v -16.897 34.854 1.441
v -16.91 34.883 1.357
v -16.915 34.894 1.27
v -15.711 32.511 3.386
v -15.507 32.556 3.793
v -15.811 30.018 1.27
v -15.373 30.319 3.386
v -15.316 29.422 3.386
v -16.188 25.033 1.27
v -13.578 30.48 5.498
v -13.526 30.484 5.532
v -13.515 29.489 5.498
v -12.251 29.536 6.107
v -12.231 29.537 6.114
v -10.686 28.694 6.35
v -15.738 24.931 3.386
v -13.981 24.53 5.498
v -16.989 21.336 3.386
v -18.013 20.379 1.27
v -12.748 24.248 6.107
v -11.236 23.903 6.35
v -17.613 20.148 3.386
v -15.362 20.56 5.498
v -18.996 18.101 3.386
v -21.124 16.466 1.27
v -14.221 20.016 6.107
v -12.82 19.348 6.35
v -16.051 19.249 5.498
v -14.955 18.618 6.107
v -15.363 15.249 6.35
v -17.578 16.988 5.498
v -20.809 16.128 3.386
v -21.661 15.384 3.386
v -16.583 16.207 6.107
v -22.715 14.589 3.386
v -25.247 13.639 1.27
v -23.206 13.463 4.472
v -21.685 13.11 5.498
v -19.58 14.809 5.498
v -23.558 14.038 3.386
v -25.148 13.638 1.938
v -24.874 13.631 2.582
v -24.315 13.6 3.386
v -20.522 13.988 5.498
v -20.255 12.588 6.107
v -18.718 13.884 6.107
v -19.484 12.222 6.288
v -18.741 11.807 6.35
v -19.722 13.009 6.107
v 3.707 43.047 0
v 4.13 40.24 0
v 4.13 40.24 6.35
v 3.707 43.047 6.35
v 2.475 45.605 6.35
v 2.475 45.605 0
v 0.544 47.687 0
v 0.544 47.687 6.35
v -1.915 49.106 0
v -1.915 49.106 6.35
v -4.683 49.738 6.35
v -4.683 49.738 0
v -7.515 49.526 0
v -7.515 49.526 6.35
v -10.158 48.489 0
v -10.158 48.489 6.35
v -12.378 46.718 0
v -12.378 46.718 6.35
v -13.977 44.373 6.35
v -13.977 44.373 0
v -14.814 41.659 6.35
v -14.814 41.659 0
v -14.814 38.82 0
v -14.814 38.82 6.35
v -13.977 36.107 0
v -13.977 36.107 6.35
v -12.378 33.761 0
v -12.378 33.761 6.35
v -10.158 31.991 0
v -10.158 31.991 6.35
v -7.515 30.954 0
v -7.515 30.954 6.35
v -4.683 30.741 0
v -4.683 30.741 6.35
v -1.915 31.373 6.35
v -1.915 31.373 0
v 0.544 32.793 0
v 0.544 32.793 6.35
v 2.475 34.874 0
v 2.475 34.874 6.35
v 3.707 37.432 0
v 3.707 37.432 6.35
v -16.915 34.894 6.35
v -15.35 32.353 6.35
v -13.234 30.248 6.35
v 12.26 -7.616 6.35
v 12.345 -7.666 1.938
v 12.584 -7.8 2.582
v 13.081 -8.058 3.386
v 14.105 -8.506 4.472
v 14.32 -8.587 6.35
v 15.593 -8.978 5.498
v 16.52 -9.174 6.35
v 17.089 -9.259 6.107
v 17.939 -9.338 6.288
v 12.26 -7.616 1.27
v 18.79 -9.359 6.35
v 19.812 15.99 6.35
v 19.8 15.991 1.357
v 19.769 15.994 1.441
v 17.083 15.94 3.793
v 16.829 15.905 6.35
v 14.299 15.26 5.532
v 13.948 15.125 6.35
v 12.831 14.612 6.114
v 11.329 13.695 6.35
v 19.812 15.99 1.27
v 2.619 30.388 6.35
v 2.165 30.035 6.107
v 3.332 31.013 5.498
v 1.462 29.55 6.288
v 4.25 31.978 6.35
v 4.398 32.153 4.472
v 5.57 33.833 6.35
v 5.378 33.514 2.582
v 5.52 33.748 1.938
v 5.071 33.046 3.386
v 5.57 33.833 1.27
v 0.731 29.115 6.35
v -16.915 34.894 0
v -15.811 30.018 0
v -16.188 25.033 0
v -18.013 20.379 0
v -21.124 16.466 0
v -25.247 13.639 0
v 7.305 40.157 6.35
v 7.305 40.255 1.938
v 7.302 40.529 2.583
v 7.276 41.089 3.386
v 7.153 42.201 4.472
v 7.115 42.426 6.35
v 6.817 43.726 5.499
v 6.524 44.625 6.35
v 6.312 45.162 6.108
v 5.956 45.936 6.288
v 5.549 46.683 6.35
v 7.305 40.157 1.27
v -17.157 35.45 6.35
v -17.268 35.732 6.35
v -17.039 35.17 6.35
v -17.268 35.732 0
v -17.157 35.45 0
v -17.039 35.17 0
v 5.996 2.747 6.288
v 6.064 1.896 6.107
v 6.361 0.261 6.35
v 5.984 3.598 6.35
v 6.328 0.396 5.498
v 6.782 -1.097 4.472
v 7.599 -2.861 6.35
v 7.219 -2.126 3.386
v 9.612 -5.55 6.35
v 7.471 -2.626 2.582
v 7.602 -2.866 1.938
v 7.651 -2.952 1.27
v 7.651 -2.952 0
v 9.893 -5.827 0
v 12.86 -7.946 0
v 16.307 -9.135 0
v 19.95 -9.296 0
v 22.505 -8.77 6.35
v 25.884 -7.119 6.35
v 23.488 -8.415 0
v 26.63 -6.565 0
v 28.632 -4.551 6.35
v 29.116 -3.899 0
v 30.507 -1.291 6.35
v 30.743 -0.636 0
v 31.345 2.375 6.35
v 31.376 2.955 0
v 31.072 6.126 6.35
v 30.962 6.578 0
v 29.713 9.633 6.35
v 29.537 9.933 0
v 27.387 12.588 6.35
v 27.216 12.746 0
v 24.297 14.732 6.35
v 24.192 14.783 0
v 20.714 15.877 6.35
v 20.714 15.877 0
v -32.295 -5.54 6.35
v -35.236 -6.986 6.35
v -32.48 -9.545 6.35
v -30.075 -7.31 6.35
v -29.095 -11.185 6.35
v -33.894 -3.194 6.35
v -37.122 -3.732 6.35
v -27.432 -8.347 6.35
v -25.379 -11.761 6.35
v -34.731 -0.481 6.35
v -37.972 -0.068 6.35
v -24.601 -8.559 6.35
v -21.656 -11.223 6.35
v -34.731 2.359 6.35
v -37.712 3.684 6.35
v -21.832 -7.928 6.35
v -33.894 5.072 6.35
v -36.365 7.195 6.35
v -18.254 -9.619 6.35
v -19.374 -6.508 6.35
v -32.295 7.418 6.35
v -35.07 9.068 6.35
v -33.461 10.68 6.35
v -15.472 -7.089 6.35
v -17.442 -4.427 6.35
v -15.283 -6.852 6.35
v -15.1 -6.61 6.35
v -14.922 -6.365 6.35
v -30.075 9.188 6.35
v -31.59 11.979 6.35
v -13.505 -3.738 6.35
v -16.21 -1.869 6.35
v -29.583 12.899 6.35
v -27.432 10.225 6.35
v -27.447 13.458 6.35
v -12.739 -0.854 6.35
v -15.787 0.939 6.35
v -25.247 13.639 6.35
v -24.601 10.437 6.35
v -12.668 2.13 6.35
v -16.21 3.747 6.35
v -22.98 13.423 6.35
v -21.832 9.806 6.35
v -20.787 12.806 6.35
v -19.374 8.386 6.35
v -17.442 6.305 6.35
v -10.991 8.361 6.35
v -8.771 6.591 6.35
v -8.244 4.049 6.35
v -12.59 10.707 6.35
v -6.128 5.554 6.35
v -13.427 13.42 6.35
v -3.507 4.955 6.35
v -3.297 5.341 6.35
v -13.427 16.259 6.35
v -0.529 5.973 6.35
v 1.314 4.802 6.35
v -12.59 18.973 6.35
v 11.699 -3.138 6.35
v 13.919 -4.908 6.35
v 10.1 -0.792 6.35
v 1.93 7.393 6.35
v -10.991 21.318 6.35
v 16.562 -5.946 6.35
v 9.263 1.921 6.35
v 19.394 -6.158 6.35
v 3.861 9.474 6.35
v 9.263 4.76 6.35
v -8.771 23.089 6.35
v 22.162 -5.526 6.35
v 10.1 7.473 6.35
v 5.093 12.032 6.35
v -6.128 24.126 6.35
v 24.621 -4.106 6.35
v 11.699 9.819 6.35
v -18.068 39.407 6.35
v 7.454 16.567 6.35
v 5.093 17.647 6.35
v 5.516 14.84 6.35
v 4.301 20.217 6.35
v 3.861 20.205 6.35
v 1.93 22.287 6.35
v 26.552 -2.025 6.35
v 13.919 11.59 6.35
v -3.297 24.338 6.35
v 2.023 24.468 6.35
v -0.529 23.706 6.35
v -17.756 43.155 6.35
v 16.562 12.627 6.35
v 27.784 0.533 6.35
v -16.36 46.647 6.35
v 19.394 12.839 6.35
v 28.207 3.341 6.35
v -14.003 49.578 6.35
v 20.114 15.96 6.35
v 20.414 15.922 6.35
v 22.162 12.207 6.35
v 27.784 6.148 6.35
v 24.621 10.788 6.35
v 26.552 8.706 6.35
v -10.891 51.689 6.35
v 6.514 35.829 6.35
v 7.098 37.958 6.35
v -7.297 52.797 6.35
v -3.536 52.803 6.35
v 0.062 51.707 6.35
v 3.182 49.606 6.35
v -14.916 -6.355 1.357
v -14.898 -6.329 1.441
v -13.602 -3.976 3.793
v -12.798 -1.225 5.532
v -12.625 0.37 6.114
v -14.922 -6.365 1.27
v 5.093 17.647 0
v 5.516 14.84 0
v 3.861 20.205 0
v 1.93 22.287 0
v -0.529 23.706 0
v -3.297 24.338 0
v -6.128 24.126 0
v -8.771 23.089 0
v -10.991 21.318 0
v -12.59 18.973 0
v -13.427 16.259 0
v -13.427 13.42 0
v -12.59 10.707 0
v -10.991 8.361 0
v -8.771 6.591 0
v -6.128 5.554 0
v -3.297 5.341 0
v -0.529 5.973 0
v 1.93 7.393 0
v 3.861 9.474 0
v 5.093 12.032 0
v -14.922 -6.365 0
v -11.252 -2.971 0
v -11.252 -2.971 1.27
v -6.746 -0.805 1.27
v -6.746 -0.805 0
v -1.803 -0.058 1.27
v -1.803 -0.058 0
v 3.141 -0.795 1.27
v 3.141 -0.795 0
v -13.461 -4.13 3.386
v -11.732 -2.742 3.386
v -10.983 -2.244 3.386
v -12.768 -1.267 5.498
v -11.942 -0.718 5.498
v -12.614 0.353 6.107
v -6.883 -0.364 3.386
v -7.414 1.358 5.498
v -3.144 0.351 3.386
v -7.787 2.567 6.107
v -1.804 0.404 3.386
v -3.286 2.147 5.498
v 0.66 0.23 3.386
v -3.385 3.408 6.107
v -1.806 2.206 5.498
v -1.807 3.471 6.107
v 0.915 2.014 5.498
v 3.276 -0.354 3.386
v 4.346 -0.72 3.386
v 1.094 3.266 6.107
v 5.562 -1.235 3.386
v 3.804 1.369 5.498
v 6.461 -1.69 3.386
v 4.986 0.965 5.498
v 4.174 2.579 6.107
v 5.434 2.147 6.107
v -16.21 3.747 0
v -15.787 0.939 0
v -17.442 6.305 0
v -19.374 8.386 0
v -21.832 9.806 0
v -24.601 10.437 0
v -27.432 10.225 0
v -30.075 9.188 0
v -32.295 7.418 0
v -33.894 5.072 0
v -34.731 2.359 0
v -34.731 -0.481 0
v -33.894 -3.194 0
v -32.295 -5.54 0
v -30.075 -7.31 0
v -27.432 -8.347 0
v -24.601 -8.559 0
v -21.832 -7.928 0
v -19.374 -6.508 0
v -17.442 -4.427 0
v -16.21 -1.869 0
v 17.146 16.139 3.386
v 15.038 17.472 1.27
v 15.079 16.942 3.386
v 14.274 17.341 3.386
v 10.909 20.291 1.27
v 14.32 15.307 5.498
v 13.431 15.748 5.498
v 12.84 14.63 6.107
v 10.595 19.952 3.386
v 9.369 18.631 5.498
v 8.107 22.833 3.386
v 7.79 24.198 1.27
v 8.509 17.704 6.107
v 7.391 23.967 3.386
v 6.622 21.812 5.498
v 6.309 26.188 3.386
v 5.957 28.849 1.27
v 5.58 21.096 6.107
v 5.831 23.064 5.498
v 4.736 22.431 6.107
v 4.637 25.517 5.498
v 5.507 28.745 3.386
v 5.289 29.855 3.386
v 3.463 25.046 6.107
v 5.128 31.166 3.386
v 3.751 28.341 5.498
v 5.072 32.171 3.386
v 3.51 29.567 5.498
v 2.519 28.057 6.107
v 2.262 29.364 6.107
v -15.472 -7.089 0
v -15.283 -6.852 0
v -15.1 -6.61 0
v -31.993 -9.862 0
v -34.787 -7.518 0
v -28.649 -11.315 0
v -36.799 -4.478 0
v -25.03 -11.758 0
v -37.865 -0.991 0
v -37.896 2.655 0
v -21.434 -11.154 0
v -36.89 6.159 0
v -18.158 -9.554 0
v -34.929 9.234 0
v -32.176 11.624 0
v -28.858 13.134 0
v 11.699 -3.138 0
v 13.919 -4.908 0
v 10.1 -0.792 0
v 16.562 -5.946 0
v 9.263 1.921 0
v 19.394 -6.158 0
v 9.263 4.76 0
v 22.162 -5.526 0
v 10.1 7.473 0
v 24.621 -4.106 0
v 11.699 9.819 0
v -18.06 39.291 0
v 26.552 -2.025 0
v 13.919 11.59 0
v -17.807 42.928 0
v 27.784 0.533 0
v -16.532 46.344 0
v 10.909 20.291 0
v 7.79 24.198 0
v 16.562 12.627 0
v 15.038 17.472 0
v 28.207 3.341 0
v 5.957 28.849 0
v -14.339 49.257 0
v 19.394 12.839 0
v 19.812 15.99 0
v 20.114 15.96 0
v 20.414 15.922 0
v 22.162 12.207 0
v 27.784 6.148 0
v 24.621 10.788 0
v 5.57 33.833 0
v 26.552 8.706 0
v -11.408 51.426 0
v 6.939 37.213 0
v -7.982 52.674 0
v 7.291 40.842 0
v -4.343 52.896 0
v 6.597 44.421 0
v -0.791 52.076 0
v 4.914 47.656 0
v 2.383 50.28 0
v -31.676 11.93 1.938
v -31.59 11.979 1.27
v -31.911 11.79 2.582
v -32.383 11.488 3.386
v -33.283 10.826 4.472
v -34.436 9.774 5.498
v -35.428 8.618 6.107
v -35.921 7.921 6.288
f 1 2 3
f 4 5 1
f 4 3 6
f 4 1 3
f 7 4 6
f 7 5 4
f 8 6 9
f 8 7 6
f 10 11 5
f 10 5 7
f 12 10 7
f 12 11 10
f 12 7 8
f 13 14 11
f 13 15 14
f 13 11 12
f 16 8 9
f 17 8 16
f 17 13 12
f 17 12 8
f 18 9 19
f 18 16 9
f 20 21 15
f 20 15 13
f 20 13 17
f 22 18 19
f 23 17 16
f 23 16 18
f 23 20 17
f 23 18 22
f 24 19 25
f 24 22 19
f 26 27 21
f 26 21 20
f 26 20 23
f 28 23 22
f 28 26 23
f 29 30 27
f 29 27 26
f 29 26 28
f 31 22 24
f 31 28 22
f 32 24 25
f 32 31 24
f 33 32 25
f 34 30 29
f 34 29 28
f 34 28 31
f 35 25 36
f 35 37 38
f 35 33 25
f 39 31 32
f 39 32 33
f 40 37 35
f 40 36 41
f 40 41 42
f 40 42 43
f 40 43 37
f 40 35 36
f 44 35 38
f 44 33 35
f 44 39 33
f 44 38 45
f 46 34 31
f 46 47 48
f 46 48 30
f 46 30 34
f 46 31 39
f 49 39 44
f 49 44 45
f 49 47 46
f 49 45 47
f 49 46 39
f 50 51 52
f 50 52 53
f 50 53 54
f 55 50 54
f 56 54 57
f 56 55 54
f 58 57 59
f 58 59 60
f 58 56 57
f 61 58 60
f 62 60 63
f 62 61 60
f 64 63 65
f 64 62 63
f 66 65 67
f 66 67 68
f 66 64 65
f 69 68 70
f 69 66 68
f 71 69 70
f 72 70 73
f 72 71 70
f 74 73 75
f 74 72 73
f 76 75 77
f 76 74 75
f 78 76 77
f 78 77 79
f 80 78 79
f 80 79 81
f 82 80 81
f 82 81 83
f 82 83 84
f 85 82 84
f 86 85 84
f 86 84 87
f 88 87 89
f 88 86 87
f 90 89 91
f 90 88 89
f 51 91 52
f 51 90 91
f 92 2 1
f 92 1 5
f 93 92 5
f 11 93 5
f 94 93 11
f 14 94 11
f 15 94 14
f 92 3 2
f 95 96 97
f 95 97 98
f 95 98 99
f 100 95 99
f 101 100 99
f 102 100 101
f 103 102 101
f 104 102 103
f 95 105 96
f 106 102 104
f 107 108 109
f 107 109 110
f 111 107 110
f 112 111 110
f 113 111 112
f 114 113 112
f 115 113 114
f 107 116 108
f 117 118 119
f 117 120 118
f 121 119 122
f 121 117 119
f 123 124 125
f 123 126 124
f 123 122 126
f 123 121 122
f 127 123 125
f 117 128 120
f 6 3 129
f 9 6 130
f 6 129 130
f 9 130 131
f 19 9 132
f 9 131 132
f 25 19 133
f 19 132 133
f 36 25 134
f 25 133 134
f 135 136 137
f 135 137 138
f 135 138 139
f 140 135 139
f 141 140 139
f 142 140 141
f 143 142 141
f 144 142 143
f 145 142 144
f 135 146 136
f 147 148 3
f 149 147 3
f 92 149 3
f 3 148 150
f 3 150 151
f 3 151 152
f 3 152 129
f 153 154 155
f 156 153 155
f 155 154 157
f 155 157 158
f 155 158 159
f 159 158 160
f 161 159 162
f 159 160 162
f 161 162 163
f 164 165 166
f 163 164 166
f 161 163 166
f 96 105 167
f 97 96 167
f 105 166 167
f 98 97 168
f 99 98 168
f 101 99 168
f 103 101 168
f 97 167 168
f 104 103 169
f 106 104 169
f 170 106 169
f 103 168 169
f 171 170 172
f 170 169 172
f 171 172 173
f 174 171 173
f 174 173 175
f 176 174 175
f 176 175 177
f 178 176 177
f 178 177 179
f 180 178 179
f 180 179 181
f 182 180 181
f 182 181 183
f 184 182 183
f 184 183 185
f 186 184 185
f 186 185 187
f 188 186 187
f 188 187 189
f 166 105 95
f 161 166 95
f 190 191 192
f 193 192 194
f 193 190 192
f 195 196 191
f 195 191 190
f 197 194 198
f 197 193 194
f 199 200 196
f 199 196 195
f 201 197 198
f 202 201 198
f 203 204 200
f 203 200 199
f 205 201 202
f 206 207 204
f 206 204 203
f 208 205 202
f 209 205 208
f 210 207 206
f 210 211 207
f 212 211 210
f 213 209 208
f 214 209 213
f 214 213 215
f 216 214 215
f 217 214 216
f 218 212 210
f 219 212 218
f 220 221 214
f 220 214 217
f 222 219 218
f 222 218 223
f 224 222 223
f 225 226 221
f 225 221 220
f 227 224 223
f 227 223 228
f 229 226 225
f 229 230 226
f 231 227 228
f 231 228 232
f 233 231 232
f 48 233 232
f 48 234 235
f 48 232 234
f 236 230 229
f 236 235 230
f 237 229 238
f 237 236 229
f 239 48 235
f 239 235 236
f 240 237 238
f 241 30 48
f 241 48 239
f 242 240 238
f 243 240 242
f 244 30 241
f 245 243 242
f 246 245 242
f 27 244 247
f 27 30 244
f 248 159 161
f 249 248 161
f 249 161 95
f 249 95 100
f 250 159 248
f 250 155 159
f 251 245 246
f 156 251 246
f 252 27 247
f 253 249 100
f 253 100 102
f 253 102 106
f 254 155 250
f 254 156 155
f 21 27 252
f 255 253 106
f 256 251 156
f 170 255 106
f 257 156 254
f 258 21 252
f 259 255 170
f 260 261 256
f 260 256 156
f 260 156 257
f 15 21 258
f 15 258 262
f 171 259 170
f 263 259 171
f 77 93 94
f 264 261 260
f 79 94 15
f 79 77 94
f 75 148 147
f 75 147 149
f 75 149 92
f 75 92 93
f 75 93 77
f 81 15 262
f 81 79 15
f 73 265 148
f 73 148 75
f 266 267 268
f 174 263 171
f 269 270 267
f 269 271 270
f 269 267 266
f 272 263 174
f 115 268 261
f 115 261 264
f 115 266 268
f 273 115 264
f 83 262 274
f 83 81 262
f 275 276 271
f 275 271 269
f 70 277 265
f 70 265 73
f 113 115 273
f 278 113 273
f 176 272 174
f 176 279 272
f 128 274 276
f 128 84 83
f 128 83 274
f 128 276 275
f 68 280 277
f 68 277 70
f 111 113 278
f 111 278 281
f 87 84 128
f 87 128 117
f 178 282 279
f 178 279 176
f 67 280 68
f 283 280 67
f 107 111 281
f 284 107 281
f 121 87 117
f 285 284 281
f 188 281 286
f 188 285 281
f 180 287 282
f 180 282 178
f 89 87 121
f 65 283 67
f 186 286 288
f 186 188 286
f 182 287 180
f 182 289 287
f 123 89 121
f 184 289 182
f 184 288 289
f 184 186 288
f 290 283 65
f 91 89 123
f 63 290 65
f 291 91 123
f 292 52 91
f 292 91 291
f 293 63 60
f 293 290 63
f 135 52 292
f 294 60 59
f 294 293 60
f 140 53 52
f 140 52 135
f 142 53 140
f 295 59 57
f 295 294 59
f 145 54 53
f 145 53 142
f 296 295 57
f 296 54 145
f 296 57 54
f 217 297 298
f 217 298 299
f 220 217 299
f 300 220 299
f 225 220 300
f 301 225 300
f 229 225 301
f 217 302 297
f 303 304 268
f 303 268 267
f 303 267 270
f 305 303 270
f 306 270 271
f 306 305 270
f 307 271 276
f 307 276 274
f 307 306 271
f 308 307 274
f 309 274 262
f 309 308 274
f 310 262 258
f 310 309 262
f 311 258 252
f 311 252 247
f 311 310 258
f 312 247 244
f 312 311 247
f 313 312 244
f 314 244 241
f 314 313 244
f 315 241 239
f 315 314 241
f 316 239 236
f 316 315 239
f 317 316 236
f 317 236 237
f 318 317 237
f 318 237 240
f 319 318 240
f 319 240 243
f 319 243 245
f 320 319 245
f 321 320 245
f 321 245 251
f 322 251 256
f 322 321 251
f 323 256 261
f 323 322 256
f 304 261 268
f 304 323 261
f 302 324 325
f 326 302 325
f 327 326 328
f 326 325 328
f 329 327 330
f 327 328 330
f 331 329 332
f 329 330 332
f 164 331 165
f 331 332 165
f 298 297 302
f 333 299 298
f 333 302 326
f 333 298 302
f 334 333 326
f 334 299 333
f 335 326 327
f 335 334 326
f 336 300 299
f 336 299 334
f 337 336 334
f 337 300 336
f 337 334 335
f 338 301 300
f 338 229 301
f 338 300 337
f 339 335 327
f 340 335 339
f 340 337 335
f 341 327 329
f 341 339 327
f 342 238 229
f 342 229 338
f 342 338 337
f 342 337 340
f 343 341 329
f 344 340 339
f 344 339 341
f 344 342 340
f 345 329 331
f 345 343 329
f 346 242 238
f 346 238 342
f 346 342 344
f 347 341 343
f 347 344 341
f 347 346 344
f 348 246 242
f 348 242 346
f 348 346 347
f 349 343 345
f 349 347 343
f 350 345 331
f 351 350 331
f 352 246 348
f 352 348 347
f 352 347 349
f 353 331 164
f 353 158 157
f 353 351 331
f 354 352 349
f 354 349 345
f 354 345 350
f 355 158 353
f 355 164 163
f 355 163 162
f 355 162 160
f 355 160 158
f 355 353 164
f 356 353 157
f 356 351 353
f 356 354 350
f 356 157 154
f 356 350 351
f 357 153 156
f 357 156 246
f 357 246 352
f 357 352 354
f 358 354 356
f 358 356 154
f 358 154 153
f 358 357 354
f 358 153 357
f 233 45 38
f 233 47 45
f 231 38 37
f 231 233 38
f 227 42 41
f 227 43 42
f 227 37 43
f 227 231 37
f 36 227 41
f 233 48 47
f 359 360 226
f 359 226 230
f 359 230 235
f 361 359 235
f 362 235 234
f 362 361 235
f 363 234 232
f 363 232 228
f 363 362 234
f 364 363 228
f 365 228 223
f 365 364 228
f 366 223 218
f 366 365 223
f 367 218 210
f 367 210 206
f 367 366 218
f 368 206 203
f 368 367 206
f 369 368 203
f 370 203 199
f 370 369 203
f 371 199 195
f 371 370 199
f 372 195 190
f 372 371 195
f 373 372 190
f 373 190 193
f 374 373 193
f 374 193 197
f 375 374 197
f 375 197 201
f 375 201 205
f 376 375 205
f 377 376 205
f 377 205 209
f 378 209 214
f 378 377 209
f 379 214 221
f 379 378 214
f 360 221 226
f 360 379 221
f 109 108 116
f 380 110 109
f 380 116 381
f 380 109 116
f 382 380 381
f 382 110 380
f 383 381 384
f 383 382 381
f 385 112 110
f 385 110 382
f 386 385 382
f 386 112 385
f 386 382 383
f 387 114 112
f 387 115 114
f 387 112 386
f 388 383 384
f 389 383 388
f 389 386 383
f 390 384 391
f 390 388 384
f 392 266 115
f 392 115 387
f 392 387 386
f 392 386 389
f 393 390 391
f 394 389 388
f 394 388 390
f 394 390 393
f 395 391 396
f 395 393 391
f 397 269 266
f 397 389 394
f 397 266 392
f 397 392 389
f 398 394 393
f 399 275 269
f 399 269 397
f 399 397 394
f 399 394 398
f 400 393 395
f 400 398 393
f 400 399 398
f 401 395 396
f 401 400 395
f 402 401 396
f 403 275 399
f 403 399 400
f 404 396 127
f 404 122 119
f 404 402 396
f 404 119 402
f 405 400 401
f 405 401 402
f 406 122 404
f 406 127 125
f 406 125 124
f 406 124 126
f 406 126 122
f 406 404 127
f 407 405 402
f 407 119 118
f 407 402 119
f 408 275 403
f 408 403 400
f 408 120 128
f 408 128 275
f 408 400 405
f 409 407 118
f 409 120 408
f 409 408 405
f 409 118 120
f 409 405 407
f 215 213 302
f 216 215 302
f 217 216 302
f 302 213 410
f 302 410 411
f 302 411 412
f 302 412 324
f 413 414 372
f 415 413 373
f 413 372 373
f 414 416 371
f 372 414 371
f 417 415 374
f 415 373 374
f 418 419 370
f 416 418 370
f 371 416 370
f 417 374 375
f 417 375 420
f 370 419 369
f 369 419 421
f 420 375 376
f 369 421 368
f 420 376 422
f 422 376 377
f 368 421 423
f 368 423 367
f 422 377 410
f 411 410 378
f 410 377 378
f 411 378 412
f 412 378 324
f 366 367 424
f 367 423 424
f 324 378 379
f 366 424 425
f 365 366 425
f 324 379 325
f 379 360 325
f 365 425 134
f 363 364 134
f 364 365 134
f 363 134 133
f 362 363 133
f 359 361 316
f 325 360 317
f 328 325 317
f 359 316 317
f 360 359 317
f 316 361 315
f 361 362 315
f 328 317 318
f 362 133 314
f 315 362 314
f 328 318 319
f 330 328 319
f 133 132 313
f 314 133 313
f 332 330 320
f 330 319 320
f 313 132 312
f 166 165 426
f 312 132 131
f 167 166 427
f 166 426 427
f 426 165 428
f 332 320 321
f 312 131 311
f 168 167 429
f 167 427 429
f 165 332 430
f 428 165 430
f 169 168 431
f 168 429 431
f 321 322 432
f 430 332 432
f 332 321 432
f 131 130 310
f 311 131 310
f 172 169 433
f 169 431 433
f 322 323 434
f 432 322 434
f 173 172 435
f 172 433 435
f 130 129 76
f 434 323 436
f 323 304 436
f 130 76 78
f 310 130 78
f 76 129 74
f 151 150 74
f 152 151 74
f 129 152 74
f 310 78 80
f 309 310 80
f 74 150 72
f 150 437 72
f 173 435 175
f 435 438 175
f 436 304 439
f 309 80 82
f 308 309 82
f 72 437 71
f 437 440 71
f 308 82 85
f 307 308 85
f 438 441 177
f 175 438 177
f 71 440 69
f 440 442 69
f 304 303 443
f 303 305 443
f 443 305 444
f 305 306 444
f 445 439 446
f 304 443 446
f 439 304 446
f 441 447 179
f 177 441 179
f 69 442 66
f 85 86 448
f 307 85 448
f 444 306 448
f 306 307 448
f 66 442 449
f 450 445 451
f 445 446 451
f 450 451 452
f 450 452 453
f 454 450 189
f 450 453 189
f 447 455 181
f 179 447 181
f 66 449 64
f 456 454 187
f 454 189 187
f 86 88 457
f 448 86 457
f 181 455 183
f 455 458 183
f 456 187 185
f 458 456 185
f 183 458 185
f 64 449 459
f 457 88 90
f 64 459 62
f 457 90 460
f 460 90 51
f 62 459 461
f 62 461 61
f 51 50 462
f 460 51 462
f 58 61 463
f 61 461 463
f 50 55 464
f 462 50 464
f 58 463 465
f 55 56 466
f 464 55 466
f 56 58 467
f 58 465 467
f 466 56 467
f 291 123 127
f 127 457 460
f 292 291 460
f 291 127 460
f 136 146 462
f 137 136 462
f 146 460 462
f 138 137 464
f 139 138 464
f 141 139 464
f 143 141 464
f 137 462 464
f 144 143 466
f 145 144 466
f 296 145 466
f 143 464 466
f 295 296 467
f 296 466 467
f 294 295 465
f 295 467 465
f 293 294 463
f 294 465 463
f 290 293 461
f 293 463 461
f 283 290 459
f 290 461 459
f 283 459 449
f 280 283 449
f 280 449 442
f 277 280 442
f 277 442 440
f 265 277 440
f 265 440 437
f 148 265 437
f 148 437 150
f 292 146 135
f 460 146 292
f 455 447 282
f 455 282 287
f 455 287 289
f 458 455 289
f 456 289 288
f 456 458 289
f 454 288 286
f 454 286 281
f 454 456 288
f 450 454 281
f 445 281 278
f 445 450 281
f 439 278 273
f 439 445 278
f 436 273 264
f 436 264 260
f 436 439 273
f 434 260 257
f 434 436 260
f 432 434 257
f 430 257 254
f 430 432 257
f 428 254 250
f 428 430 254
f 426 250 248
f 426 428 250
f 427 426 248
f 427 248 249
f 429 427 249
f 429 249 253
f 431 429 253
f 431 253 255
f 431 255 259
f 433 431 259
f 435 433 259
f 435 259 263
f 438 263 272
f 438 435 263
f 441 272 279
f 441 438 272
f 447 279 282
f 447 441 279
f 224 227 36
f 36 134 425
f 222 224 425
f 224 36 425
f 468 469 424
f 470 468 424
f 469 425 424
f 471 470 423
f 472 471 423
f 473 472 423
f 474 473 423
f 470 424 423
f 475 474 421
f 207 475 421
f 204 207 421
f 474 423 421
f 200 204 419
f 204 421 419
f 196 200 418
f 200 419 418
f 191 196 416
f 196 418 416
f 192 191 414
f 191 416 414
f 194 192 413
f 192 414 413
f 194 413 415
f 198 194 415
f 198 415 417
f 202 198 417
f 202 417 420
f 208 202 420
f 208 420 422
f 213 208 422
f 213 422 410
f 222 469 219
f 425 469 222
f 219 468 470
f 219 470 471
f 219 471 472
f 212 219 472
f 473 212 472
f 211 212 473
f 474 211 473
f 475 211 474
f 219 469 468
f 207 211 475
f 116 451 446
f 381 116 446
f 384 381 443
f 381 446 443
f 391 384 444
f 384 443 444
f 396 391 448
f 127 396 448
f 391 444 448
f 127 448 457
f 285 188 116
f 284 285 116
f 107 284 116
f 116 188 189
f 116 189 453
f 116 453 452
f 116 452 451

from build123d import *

# Parameters (mm, degrees)
F0_R         = 9.525
F1_DEPTH     = 6.35
F2_T4_ANGLE  = 171.8918539933
F2_S5_R      = 12.7
F2_T6_DEPTH  = 33
F2_S7_R      = 12.7
F2_T8_DEPTH  = 33
F2_T12_ANGLE = 171.8918539933
F2_S13_R     = 12.7
F2_T14_DEPTH = 34
F2_S15_R     = 12.7
F2_T16_DEPTH = 34
F2_T20_ANGLE = 171.8918539933
F2_S21_R     = 12.7
F2_T22_DEPTH = 33
F2_S23_R     = 12.7
F2_T24_DEPTH = 33


# Not quite as in the source:
# - a fillet or chamfer that OpenCascade refuses, or shapes differently, is made with other operations: its cross-section is extruded or revolved along the edge and cut away or added


with BuildPart() as f1:
    # F0 (on Top) → F1 (new body)
    with BuildSketch(Plane.XY):
        with BuildLine():
            ThreePointArc((-16.9151689036, 34.8937534074), (-16.926787396, 22.6379285555), (-25.2467054302, 13.6387985033))
            ThreePointArc((-25.2467054302, 13.6387985033), (-36.7990792752, -4.4780457484), (-15.4716495202, -7.0892001179))
            ThreePointArc((-15.4716495202, -7.0892001179), (-15.2019637006, -6.723178945), (-14.922490674, -6.3645750302))
            ThreePointArc((-14.922490674, -6.3645750302), (-4.3028257617, -0.2467245138), (7.6506084925, -2.9524198627))
            ThreePointArc((7.6506084925, -2.9524198627), (29.1164427734, -3.8986469606), (20.7140539132, 15.8770261894))
            ThreePointArc((20.7140539132, 15.8770261894), (20.2622273693, 15.9275703737), (19.8119307558, 15.9902991571))
            ThreePointArc((19.8119307558, 15.9902991571), (9.2038843359, 22.1282734926), (5.5703681159, 33.8330988937))
            ThreePointArc((5.5703681159, 33.8330988937), (-4.34309232, 52.8961702433), (-17.2681332147, 35.7316514628))
            ThreePointArc((-17.2681332147, 35.7316514628), (-17.0859924904, 35.3150861055), (-16.9151689036, 34.8937534074))
        make_face()
        with Locations((-25.31230589, 0.9389679304)):
            Circle(F0_R, mode=Mode.SUBTRACT)
        with Locations((-4.0085762739, 14.8398258448)):
            Circle(F0_R, mode=Mode.SUBTRACT)
        with Locations((18.6817846223, 3.3406837591)):
            Circle(F0_R, mode=Mode.SUBTRACT)
        with Locations((-5.3952075541, 40.2398258448)):
            Circle(F0_R, mode=Mode.SUBTRACT)
        with BuildLine():
            ThreePointArc((-14.922490674, -6.3645750302), (-15.2019637006, -6.723178945), (-15.4716495202, -7.0892001179))
            ThreePointArc((-15.4716495202, -7.0892001179), (-15.1905834316, -6.7318035089), (-14.922490674, -6.3645750302))
        make_face()
        with BuildLine():
            ThreePointArc((-17.2681332147, 35.7316514628), (-17.0991517164, 35.3095427854), (-16.9151689036, 34.8937534074))
            ThreePointArc((-16.9151689036, 34.8937534074), (-17.0859924904, 35.3150861055), (-17.2681332147, 35.7316514628))
        make_face()
        with BuildLine():
            ThreePointArc((19.8119307558, 15.9902991571), (20.2622273693, 15.9275703737), (20.7140539132, 15.8770261894))
            ThreePointArc((20.7140539132, 15.8770261894), (20.2640063262, 15.9417382578), (19.8119307558, 15.9902991571))
        make_face()
    extrude(amount=F1_DEPTH)

    # F2: fillet of radius 5.08 on 3 edges, made by hand


with BuildPart() as f2_tool2:
    # F2_s3 → F2_t4 (revolve)
    with BuildSketch(Plane(origin=(1.3219976545, -16.6427211425, 0), x_dir=(0, 0, 1), z_dir=(0.0791845597, -0.9968599729, 0))):
        with BuildLine():
            ThreePointArc((1.27, 19.9508919573), (4.8621024484, 21.4387895089), (6.35, 25.0308919573))
            Line((6.35, 25.0308919573), (6.35, 19.9508919573))
            Line((6.35, 19.9508919573), (1.27, 19.9508919573))
        make_face()
    revolve(axis=Axis((-1.7870715149, -16.8896868949, 6.35), (0, 0, -1)), revolution_arc=F2_T4_ANGLE)

    # F2_s5 → F2_t6 (cut, symmetric)
    with BuildSketch(Plane.XY.offset(2)):
        with Locations((-25.31230589, 0.9389679304)):
            Circle(F2_S5_R)
    extrude(amount=F2_T6_DEPTH, both=True, mode=Mode.SUBTRACT)

    # F2_s7 → F2_t8 (cut, symmetric)
    with BuildSketch(Plane.XY.offset(2)):
        with Locations((18.6817846223, 3.3406837591)):
            Circle(F2_S7_R)
    extrude(amount=F2_T8_DEPTH, both=True, mode=Mode.SUBTRACT)


with BuildPart() as f1_1:
    add(f1.part)

    # F2_t1: cut F2_tool2
    add(f2_tool2.part, mode=Mode.SUBTRACT)


with BuildPart() as f2_tool10:
    # F2_s11 → F2_t12 (revolve)
    with BuildSketch(Plane(origin=(30.4099792651, 20.9327995218, 0), x_dir=(0, 0, 1), z_dir=(0.8237137807, 0.5670058267, 0))):
        with BuildLine():
            ThreePointArc((1.27, 2.6333326422), (4.8621024484, 4.1212301938), (6.35, 7.7133326422))
            Line((6.35, 7.7133326422), (6.35, 2.6333326422))
            Line((6.35, 2.6333326422), (1.27, 2.6333326422))
        make_face()
    revolve(axis=Axis((22.3592354288, 32.6284617706, 6.35), (0, 0, -1)), revolution_arc=F2_T12_ANGLE)

    # F2_s13 → F2_t14 (cut, symmetric)
    with BuildSketch(Plane.XY.offset(2)):
        with Locations((18.6817846223, 3.3406837591)):
            Circle(F2_S13_R)
    extrude(amount=F2_T14_DEPTH, both=True, mode=Mode.SUBTRACT)

    # F2_s15 → F2_t16 (cut, symmetric)
    with BuildSketch(Plane.XY.offset(2)):
        with Locations((-5.3952075541, 40.2398258448)):
            Circle(F2_S15_R)
    extrude(amount=F2_T16_DEPTH, both=True, mode=Mode.SUBTRACT)


with BuildPart() as f1_2:
    add(f1_1.part)

    # F2_t9: cut F2_tool10
    add(f2_tool10.part, mode=Mode.SUBTRACT)


with BuildPart() as f2_tool18:
    # F2_s19 → F2_t20 (revolve)
    with BuildSketch(Plane(origin=(-37.7448413305, 17.9696603878, 0), x_dir=(0, 0, 1), z_dir=(-0.9028983404, 0.4298541461, 0))):
        with BuildLine():
            ThreePointArc((1.27, 28.8057387926), (4.8621024484, 30.2936363442), (6.35, 33.8857387926))
            Line((6.35, 33.8857387926), (6.35, 28.8057387926))
            Line((6.35, 28.8057387926), (1.27, 28.8057387926))
        make_face()
    revolve(axis=Axis((-32.5978927357, 28.7807026587, 6.35), (0, 0, -1)), revolution_arc=F2_T20_ANGLE)

    # F2_s21 → F2_t22 (cut, symmetric)
    with BuildSketch(Plane.XY.offset(2)):
        with Locations((-25.31230589, 0.9389679304)):
            Circle(F2_S21_R)
    extrude(amount=F2_T22_DEPTH, both=True, mode=Mode.SUBTRACT)

    # F2_s23 → F2_t24 (cut, symmetric)
    with BuildSketch(Plane.XY.offset(2)):
        with Locations((-5.3952075541, 40.2398258448)):
            Circle(F2_S23_R)
    extrude(amount=F2_T24_DEPTH, both=True, mode=Mode.SUBTRACT)


with BuildPart() as f1_3:
    add(f1_2.part)

    # F2_t17: cut F2_tool18
    add(f2_tool18.part, mode=Mode.SUBTRACT)


solid = f1_3.part
